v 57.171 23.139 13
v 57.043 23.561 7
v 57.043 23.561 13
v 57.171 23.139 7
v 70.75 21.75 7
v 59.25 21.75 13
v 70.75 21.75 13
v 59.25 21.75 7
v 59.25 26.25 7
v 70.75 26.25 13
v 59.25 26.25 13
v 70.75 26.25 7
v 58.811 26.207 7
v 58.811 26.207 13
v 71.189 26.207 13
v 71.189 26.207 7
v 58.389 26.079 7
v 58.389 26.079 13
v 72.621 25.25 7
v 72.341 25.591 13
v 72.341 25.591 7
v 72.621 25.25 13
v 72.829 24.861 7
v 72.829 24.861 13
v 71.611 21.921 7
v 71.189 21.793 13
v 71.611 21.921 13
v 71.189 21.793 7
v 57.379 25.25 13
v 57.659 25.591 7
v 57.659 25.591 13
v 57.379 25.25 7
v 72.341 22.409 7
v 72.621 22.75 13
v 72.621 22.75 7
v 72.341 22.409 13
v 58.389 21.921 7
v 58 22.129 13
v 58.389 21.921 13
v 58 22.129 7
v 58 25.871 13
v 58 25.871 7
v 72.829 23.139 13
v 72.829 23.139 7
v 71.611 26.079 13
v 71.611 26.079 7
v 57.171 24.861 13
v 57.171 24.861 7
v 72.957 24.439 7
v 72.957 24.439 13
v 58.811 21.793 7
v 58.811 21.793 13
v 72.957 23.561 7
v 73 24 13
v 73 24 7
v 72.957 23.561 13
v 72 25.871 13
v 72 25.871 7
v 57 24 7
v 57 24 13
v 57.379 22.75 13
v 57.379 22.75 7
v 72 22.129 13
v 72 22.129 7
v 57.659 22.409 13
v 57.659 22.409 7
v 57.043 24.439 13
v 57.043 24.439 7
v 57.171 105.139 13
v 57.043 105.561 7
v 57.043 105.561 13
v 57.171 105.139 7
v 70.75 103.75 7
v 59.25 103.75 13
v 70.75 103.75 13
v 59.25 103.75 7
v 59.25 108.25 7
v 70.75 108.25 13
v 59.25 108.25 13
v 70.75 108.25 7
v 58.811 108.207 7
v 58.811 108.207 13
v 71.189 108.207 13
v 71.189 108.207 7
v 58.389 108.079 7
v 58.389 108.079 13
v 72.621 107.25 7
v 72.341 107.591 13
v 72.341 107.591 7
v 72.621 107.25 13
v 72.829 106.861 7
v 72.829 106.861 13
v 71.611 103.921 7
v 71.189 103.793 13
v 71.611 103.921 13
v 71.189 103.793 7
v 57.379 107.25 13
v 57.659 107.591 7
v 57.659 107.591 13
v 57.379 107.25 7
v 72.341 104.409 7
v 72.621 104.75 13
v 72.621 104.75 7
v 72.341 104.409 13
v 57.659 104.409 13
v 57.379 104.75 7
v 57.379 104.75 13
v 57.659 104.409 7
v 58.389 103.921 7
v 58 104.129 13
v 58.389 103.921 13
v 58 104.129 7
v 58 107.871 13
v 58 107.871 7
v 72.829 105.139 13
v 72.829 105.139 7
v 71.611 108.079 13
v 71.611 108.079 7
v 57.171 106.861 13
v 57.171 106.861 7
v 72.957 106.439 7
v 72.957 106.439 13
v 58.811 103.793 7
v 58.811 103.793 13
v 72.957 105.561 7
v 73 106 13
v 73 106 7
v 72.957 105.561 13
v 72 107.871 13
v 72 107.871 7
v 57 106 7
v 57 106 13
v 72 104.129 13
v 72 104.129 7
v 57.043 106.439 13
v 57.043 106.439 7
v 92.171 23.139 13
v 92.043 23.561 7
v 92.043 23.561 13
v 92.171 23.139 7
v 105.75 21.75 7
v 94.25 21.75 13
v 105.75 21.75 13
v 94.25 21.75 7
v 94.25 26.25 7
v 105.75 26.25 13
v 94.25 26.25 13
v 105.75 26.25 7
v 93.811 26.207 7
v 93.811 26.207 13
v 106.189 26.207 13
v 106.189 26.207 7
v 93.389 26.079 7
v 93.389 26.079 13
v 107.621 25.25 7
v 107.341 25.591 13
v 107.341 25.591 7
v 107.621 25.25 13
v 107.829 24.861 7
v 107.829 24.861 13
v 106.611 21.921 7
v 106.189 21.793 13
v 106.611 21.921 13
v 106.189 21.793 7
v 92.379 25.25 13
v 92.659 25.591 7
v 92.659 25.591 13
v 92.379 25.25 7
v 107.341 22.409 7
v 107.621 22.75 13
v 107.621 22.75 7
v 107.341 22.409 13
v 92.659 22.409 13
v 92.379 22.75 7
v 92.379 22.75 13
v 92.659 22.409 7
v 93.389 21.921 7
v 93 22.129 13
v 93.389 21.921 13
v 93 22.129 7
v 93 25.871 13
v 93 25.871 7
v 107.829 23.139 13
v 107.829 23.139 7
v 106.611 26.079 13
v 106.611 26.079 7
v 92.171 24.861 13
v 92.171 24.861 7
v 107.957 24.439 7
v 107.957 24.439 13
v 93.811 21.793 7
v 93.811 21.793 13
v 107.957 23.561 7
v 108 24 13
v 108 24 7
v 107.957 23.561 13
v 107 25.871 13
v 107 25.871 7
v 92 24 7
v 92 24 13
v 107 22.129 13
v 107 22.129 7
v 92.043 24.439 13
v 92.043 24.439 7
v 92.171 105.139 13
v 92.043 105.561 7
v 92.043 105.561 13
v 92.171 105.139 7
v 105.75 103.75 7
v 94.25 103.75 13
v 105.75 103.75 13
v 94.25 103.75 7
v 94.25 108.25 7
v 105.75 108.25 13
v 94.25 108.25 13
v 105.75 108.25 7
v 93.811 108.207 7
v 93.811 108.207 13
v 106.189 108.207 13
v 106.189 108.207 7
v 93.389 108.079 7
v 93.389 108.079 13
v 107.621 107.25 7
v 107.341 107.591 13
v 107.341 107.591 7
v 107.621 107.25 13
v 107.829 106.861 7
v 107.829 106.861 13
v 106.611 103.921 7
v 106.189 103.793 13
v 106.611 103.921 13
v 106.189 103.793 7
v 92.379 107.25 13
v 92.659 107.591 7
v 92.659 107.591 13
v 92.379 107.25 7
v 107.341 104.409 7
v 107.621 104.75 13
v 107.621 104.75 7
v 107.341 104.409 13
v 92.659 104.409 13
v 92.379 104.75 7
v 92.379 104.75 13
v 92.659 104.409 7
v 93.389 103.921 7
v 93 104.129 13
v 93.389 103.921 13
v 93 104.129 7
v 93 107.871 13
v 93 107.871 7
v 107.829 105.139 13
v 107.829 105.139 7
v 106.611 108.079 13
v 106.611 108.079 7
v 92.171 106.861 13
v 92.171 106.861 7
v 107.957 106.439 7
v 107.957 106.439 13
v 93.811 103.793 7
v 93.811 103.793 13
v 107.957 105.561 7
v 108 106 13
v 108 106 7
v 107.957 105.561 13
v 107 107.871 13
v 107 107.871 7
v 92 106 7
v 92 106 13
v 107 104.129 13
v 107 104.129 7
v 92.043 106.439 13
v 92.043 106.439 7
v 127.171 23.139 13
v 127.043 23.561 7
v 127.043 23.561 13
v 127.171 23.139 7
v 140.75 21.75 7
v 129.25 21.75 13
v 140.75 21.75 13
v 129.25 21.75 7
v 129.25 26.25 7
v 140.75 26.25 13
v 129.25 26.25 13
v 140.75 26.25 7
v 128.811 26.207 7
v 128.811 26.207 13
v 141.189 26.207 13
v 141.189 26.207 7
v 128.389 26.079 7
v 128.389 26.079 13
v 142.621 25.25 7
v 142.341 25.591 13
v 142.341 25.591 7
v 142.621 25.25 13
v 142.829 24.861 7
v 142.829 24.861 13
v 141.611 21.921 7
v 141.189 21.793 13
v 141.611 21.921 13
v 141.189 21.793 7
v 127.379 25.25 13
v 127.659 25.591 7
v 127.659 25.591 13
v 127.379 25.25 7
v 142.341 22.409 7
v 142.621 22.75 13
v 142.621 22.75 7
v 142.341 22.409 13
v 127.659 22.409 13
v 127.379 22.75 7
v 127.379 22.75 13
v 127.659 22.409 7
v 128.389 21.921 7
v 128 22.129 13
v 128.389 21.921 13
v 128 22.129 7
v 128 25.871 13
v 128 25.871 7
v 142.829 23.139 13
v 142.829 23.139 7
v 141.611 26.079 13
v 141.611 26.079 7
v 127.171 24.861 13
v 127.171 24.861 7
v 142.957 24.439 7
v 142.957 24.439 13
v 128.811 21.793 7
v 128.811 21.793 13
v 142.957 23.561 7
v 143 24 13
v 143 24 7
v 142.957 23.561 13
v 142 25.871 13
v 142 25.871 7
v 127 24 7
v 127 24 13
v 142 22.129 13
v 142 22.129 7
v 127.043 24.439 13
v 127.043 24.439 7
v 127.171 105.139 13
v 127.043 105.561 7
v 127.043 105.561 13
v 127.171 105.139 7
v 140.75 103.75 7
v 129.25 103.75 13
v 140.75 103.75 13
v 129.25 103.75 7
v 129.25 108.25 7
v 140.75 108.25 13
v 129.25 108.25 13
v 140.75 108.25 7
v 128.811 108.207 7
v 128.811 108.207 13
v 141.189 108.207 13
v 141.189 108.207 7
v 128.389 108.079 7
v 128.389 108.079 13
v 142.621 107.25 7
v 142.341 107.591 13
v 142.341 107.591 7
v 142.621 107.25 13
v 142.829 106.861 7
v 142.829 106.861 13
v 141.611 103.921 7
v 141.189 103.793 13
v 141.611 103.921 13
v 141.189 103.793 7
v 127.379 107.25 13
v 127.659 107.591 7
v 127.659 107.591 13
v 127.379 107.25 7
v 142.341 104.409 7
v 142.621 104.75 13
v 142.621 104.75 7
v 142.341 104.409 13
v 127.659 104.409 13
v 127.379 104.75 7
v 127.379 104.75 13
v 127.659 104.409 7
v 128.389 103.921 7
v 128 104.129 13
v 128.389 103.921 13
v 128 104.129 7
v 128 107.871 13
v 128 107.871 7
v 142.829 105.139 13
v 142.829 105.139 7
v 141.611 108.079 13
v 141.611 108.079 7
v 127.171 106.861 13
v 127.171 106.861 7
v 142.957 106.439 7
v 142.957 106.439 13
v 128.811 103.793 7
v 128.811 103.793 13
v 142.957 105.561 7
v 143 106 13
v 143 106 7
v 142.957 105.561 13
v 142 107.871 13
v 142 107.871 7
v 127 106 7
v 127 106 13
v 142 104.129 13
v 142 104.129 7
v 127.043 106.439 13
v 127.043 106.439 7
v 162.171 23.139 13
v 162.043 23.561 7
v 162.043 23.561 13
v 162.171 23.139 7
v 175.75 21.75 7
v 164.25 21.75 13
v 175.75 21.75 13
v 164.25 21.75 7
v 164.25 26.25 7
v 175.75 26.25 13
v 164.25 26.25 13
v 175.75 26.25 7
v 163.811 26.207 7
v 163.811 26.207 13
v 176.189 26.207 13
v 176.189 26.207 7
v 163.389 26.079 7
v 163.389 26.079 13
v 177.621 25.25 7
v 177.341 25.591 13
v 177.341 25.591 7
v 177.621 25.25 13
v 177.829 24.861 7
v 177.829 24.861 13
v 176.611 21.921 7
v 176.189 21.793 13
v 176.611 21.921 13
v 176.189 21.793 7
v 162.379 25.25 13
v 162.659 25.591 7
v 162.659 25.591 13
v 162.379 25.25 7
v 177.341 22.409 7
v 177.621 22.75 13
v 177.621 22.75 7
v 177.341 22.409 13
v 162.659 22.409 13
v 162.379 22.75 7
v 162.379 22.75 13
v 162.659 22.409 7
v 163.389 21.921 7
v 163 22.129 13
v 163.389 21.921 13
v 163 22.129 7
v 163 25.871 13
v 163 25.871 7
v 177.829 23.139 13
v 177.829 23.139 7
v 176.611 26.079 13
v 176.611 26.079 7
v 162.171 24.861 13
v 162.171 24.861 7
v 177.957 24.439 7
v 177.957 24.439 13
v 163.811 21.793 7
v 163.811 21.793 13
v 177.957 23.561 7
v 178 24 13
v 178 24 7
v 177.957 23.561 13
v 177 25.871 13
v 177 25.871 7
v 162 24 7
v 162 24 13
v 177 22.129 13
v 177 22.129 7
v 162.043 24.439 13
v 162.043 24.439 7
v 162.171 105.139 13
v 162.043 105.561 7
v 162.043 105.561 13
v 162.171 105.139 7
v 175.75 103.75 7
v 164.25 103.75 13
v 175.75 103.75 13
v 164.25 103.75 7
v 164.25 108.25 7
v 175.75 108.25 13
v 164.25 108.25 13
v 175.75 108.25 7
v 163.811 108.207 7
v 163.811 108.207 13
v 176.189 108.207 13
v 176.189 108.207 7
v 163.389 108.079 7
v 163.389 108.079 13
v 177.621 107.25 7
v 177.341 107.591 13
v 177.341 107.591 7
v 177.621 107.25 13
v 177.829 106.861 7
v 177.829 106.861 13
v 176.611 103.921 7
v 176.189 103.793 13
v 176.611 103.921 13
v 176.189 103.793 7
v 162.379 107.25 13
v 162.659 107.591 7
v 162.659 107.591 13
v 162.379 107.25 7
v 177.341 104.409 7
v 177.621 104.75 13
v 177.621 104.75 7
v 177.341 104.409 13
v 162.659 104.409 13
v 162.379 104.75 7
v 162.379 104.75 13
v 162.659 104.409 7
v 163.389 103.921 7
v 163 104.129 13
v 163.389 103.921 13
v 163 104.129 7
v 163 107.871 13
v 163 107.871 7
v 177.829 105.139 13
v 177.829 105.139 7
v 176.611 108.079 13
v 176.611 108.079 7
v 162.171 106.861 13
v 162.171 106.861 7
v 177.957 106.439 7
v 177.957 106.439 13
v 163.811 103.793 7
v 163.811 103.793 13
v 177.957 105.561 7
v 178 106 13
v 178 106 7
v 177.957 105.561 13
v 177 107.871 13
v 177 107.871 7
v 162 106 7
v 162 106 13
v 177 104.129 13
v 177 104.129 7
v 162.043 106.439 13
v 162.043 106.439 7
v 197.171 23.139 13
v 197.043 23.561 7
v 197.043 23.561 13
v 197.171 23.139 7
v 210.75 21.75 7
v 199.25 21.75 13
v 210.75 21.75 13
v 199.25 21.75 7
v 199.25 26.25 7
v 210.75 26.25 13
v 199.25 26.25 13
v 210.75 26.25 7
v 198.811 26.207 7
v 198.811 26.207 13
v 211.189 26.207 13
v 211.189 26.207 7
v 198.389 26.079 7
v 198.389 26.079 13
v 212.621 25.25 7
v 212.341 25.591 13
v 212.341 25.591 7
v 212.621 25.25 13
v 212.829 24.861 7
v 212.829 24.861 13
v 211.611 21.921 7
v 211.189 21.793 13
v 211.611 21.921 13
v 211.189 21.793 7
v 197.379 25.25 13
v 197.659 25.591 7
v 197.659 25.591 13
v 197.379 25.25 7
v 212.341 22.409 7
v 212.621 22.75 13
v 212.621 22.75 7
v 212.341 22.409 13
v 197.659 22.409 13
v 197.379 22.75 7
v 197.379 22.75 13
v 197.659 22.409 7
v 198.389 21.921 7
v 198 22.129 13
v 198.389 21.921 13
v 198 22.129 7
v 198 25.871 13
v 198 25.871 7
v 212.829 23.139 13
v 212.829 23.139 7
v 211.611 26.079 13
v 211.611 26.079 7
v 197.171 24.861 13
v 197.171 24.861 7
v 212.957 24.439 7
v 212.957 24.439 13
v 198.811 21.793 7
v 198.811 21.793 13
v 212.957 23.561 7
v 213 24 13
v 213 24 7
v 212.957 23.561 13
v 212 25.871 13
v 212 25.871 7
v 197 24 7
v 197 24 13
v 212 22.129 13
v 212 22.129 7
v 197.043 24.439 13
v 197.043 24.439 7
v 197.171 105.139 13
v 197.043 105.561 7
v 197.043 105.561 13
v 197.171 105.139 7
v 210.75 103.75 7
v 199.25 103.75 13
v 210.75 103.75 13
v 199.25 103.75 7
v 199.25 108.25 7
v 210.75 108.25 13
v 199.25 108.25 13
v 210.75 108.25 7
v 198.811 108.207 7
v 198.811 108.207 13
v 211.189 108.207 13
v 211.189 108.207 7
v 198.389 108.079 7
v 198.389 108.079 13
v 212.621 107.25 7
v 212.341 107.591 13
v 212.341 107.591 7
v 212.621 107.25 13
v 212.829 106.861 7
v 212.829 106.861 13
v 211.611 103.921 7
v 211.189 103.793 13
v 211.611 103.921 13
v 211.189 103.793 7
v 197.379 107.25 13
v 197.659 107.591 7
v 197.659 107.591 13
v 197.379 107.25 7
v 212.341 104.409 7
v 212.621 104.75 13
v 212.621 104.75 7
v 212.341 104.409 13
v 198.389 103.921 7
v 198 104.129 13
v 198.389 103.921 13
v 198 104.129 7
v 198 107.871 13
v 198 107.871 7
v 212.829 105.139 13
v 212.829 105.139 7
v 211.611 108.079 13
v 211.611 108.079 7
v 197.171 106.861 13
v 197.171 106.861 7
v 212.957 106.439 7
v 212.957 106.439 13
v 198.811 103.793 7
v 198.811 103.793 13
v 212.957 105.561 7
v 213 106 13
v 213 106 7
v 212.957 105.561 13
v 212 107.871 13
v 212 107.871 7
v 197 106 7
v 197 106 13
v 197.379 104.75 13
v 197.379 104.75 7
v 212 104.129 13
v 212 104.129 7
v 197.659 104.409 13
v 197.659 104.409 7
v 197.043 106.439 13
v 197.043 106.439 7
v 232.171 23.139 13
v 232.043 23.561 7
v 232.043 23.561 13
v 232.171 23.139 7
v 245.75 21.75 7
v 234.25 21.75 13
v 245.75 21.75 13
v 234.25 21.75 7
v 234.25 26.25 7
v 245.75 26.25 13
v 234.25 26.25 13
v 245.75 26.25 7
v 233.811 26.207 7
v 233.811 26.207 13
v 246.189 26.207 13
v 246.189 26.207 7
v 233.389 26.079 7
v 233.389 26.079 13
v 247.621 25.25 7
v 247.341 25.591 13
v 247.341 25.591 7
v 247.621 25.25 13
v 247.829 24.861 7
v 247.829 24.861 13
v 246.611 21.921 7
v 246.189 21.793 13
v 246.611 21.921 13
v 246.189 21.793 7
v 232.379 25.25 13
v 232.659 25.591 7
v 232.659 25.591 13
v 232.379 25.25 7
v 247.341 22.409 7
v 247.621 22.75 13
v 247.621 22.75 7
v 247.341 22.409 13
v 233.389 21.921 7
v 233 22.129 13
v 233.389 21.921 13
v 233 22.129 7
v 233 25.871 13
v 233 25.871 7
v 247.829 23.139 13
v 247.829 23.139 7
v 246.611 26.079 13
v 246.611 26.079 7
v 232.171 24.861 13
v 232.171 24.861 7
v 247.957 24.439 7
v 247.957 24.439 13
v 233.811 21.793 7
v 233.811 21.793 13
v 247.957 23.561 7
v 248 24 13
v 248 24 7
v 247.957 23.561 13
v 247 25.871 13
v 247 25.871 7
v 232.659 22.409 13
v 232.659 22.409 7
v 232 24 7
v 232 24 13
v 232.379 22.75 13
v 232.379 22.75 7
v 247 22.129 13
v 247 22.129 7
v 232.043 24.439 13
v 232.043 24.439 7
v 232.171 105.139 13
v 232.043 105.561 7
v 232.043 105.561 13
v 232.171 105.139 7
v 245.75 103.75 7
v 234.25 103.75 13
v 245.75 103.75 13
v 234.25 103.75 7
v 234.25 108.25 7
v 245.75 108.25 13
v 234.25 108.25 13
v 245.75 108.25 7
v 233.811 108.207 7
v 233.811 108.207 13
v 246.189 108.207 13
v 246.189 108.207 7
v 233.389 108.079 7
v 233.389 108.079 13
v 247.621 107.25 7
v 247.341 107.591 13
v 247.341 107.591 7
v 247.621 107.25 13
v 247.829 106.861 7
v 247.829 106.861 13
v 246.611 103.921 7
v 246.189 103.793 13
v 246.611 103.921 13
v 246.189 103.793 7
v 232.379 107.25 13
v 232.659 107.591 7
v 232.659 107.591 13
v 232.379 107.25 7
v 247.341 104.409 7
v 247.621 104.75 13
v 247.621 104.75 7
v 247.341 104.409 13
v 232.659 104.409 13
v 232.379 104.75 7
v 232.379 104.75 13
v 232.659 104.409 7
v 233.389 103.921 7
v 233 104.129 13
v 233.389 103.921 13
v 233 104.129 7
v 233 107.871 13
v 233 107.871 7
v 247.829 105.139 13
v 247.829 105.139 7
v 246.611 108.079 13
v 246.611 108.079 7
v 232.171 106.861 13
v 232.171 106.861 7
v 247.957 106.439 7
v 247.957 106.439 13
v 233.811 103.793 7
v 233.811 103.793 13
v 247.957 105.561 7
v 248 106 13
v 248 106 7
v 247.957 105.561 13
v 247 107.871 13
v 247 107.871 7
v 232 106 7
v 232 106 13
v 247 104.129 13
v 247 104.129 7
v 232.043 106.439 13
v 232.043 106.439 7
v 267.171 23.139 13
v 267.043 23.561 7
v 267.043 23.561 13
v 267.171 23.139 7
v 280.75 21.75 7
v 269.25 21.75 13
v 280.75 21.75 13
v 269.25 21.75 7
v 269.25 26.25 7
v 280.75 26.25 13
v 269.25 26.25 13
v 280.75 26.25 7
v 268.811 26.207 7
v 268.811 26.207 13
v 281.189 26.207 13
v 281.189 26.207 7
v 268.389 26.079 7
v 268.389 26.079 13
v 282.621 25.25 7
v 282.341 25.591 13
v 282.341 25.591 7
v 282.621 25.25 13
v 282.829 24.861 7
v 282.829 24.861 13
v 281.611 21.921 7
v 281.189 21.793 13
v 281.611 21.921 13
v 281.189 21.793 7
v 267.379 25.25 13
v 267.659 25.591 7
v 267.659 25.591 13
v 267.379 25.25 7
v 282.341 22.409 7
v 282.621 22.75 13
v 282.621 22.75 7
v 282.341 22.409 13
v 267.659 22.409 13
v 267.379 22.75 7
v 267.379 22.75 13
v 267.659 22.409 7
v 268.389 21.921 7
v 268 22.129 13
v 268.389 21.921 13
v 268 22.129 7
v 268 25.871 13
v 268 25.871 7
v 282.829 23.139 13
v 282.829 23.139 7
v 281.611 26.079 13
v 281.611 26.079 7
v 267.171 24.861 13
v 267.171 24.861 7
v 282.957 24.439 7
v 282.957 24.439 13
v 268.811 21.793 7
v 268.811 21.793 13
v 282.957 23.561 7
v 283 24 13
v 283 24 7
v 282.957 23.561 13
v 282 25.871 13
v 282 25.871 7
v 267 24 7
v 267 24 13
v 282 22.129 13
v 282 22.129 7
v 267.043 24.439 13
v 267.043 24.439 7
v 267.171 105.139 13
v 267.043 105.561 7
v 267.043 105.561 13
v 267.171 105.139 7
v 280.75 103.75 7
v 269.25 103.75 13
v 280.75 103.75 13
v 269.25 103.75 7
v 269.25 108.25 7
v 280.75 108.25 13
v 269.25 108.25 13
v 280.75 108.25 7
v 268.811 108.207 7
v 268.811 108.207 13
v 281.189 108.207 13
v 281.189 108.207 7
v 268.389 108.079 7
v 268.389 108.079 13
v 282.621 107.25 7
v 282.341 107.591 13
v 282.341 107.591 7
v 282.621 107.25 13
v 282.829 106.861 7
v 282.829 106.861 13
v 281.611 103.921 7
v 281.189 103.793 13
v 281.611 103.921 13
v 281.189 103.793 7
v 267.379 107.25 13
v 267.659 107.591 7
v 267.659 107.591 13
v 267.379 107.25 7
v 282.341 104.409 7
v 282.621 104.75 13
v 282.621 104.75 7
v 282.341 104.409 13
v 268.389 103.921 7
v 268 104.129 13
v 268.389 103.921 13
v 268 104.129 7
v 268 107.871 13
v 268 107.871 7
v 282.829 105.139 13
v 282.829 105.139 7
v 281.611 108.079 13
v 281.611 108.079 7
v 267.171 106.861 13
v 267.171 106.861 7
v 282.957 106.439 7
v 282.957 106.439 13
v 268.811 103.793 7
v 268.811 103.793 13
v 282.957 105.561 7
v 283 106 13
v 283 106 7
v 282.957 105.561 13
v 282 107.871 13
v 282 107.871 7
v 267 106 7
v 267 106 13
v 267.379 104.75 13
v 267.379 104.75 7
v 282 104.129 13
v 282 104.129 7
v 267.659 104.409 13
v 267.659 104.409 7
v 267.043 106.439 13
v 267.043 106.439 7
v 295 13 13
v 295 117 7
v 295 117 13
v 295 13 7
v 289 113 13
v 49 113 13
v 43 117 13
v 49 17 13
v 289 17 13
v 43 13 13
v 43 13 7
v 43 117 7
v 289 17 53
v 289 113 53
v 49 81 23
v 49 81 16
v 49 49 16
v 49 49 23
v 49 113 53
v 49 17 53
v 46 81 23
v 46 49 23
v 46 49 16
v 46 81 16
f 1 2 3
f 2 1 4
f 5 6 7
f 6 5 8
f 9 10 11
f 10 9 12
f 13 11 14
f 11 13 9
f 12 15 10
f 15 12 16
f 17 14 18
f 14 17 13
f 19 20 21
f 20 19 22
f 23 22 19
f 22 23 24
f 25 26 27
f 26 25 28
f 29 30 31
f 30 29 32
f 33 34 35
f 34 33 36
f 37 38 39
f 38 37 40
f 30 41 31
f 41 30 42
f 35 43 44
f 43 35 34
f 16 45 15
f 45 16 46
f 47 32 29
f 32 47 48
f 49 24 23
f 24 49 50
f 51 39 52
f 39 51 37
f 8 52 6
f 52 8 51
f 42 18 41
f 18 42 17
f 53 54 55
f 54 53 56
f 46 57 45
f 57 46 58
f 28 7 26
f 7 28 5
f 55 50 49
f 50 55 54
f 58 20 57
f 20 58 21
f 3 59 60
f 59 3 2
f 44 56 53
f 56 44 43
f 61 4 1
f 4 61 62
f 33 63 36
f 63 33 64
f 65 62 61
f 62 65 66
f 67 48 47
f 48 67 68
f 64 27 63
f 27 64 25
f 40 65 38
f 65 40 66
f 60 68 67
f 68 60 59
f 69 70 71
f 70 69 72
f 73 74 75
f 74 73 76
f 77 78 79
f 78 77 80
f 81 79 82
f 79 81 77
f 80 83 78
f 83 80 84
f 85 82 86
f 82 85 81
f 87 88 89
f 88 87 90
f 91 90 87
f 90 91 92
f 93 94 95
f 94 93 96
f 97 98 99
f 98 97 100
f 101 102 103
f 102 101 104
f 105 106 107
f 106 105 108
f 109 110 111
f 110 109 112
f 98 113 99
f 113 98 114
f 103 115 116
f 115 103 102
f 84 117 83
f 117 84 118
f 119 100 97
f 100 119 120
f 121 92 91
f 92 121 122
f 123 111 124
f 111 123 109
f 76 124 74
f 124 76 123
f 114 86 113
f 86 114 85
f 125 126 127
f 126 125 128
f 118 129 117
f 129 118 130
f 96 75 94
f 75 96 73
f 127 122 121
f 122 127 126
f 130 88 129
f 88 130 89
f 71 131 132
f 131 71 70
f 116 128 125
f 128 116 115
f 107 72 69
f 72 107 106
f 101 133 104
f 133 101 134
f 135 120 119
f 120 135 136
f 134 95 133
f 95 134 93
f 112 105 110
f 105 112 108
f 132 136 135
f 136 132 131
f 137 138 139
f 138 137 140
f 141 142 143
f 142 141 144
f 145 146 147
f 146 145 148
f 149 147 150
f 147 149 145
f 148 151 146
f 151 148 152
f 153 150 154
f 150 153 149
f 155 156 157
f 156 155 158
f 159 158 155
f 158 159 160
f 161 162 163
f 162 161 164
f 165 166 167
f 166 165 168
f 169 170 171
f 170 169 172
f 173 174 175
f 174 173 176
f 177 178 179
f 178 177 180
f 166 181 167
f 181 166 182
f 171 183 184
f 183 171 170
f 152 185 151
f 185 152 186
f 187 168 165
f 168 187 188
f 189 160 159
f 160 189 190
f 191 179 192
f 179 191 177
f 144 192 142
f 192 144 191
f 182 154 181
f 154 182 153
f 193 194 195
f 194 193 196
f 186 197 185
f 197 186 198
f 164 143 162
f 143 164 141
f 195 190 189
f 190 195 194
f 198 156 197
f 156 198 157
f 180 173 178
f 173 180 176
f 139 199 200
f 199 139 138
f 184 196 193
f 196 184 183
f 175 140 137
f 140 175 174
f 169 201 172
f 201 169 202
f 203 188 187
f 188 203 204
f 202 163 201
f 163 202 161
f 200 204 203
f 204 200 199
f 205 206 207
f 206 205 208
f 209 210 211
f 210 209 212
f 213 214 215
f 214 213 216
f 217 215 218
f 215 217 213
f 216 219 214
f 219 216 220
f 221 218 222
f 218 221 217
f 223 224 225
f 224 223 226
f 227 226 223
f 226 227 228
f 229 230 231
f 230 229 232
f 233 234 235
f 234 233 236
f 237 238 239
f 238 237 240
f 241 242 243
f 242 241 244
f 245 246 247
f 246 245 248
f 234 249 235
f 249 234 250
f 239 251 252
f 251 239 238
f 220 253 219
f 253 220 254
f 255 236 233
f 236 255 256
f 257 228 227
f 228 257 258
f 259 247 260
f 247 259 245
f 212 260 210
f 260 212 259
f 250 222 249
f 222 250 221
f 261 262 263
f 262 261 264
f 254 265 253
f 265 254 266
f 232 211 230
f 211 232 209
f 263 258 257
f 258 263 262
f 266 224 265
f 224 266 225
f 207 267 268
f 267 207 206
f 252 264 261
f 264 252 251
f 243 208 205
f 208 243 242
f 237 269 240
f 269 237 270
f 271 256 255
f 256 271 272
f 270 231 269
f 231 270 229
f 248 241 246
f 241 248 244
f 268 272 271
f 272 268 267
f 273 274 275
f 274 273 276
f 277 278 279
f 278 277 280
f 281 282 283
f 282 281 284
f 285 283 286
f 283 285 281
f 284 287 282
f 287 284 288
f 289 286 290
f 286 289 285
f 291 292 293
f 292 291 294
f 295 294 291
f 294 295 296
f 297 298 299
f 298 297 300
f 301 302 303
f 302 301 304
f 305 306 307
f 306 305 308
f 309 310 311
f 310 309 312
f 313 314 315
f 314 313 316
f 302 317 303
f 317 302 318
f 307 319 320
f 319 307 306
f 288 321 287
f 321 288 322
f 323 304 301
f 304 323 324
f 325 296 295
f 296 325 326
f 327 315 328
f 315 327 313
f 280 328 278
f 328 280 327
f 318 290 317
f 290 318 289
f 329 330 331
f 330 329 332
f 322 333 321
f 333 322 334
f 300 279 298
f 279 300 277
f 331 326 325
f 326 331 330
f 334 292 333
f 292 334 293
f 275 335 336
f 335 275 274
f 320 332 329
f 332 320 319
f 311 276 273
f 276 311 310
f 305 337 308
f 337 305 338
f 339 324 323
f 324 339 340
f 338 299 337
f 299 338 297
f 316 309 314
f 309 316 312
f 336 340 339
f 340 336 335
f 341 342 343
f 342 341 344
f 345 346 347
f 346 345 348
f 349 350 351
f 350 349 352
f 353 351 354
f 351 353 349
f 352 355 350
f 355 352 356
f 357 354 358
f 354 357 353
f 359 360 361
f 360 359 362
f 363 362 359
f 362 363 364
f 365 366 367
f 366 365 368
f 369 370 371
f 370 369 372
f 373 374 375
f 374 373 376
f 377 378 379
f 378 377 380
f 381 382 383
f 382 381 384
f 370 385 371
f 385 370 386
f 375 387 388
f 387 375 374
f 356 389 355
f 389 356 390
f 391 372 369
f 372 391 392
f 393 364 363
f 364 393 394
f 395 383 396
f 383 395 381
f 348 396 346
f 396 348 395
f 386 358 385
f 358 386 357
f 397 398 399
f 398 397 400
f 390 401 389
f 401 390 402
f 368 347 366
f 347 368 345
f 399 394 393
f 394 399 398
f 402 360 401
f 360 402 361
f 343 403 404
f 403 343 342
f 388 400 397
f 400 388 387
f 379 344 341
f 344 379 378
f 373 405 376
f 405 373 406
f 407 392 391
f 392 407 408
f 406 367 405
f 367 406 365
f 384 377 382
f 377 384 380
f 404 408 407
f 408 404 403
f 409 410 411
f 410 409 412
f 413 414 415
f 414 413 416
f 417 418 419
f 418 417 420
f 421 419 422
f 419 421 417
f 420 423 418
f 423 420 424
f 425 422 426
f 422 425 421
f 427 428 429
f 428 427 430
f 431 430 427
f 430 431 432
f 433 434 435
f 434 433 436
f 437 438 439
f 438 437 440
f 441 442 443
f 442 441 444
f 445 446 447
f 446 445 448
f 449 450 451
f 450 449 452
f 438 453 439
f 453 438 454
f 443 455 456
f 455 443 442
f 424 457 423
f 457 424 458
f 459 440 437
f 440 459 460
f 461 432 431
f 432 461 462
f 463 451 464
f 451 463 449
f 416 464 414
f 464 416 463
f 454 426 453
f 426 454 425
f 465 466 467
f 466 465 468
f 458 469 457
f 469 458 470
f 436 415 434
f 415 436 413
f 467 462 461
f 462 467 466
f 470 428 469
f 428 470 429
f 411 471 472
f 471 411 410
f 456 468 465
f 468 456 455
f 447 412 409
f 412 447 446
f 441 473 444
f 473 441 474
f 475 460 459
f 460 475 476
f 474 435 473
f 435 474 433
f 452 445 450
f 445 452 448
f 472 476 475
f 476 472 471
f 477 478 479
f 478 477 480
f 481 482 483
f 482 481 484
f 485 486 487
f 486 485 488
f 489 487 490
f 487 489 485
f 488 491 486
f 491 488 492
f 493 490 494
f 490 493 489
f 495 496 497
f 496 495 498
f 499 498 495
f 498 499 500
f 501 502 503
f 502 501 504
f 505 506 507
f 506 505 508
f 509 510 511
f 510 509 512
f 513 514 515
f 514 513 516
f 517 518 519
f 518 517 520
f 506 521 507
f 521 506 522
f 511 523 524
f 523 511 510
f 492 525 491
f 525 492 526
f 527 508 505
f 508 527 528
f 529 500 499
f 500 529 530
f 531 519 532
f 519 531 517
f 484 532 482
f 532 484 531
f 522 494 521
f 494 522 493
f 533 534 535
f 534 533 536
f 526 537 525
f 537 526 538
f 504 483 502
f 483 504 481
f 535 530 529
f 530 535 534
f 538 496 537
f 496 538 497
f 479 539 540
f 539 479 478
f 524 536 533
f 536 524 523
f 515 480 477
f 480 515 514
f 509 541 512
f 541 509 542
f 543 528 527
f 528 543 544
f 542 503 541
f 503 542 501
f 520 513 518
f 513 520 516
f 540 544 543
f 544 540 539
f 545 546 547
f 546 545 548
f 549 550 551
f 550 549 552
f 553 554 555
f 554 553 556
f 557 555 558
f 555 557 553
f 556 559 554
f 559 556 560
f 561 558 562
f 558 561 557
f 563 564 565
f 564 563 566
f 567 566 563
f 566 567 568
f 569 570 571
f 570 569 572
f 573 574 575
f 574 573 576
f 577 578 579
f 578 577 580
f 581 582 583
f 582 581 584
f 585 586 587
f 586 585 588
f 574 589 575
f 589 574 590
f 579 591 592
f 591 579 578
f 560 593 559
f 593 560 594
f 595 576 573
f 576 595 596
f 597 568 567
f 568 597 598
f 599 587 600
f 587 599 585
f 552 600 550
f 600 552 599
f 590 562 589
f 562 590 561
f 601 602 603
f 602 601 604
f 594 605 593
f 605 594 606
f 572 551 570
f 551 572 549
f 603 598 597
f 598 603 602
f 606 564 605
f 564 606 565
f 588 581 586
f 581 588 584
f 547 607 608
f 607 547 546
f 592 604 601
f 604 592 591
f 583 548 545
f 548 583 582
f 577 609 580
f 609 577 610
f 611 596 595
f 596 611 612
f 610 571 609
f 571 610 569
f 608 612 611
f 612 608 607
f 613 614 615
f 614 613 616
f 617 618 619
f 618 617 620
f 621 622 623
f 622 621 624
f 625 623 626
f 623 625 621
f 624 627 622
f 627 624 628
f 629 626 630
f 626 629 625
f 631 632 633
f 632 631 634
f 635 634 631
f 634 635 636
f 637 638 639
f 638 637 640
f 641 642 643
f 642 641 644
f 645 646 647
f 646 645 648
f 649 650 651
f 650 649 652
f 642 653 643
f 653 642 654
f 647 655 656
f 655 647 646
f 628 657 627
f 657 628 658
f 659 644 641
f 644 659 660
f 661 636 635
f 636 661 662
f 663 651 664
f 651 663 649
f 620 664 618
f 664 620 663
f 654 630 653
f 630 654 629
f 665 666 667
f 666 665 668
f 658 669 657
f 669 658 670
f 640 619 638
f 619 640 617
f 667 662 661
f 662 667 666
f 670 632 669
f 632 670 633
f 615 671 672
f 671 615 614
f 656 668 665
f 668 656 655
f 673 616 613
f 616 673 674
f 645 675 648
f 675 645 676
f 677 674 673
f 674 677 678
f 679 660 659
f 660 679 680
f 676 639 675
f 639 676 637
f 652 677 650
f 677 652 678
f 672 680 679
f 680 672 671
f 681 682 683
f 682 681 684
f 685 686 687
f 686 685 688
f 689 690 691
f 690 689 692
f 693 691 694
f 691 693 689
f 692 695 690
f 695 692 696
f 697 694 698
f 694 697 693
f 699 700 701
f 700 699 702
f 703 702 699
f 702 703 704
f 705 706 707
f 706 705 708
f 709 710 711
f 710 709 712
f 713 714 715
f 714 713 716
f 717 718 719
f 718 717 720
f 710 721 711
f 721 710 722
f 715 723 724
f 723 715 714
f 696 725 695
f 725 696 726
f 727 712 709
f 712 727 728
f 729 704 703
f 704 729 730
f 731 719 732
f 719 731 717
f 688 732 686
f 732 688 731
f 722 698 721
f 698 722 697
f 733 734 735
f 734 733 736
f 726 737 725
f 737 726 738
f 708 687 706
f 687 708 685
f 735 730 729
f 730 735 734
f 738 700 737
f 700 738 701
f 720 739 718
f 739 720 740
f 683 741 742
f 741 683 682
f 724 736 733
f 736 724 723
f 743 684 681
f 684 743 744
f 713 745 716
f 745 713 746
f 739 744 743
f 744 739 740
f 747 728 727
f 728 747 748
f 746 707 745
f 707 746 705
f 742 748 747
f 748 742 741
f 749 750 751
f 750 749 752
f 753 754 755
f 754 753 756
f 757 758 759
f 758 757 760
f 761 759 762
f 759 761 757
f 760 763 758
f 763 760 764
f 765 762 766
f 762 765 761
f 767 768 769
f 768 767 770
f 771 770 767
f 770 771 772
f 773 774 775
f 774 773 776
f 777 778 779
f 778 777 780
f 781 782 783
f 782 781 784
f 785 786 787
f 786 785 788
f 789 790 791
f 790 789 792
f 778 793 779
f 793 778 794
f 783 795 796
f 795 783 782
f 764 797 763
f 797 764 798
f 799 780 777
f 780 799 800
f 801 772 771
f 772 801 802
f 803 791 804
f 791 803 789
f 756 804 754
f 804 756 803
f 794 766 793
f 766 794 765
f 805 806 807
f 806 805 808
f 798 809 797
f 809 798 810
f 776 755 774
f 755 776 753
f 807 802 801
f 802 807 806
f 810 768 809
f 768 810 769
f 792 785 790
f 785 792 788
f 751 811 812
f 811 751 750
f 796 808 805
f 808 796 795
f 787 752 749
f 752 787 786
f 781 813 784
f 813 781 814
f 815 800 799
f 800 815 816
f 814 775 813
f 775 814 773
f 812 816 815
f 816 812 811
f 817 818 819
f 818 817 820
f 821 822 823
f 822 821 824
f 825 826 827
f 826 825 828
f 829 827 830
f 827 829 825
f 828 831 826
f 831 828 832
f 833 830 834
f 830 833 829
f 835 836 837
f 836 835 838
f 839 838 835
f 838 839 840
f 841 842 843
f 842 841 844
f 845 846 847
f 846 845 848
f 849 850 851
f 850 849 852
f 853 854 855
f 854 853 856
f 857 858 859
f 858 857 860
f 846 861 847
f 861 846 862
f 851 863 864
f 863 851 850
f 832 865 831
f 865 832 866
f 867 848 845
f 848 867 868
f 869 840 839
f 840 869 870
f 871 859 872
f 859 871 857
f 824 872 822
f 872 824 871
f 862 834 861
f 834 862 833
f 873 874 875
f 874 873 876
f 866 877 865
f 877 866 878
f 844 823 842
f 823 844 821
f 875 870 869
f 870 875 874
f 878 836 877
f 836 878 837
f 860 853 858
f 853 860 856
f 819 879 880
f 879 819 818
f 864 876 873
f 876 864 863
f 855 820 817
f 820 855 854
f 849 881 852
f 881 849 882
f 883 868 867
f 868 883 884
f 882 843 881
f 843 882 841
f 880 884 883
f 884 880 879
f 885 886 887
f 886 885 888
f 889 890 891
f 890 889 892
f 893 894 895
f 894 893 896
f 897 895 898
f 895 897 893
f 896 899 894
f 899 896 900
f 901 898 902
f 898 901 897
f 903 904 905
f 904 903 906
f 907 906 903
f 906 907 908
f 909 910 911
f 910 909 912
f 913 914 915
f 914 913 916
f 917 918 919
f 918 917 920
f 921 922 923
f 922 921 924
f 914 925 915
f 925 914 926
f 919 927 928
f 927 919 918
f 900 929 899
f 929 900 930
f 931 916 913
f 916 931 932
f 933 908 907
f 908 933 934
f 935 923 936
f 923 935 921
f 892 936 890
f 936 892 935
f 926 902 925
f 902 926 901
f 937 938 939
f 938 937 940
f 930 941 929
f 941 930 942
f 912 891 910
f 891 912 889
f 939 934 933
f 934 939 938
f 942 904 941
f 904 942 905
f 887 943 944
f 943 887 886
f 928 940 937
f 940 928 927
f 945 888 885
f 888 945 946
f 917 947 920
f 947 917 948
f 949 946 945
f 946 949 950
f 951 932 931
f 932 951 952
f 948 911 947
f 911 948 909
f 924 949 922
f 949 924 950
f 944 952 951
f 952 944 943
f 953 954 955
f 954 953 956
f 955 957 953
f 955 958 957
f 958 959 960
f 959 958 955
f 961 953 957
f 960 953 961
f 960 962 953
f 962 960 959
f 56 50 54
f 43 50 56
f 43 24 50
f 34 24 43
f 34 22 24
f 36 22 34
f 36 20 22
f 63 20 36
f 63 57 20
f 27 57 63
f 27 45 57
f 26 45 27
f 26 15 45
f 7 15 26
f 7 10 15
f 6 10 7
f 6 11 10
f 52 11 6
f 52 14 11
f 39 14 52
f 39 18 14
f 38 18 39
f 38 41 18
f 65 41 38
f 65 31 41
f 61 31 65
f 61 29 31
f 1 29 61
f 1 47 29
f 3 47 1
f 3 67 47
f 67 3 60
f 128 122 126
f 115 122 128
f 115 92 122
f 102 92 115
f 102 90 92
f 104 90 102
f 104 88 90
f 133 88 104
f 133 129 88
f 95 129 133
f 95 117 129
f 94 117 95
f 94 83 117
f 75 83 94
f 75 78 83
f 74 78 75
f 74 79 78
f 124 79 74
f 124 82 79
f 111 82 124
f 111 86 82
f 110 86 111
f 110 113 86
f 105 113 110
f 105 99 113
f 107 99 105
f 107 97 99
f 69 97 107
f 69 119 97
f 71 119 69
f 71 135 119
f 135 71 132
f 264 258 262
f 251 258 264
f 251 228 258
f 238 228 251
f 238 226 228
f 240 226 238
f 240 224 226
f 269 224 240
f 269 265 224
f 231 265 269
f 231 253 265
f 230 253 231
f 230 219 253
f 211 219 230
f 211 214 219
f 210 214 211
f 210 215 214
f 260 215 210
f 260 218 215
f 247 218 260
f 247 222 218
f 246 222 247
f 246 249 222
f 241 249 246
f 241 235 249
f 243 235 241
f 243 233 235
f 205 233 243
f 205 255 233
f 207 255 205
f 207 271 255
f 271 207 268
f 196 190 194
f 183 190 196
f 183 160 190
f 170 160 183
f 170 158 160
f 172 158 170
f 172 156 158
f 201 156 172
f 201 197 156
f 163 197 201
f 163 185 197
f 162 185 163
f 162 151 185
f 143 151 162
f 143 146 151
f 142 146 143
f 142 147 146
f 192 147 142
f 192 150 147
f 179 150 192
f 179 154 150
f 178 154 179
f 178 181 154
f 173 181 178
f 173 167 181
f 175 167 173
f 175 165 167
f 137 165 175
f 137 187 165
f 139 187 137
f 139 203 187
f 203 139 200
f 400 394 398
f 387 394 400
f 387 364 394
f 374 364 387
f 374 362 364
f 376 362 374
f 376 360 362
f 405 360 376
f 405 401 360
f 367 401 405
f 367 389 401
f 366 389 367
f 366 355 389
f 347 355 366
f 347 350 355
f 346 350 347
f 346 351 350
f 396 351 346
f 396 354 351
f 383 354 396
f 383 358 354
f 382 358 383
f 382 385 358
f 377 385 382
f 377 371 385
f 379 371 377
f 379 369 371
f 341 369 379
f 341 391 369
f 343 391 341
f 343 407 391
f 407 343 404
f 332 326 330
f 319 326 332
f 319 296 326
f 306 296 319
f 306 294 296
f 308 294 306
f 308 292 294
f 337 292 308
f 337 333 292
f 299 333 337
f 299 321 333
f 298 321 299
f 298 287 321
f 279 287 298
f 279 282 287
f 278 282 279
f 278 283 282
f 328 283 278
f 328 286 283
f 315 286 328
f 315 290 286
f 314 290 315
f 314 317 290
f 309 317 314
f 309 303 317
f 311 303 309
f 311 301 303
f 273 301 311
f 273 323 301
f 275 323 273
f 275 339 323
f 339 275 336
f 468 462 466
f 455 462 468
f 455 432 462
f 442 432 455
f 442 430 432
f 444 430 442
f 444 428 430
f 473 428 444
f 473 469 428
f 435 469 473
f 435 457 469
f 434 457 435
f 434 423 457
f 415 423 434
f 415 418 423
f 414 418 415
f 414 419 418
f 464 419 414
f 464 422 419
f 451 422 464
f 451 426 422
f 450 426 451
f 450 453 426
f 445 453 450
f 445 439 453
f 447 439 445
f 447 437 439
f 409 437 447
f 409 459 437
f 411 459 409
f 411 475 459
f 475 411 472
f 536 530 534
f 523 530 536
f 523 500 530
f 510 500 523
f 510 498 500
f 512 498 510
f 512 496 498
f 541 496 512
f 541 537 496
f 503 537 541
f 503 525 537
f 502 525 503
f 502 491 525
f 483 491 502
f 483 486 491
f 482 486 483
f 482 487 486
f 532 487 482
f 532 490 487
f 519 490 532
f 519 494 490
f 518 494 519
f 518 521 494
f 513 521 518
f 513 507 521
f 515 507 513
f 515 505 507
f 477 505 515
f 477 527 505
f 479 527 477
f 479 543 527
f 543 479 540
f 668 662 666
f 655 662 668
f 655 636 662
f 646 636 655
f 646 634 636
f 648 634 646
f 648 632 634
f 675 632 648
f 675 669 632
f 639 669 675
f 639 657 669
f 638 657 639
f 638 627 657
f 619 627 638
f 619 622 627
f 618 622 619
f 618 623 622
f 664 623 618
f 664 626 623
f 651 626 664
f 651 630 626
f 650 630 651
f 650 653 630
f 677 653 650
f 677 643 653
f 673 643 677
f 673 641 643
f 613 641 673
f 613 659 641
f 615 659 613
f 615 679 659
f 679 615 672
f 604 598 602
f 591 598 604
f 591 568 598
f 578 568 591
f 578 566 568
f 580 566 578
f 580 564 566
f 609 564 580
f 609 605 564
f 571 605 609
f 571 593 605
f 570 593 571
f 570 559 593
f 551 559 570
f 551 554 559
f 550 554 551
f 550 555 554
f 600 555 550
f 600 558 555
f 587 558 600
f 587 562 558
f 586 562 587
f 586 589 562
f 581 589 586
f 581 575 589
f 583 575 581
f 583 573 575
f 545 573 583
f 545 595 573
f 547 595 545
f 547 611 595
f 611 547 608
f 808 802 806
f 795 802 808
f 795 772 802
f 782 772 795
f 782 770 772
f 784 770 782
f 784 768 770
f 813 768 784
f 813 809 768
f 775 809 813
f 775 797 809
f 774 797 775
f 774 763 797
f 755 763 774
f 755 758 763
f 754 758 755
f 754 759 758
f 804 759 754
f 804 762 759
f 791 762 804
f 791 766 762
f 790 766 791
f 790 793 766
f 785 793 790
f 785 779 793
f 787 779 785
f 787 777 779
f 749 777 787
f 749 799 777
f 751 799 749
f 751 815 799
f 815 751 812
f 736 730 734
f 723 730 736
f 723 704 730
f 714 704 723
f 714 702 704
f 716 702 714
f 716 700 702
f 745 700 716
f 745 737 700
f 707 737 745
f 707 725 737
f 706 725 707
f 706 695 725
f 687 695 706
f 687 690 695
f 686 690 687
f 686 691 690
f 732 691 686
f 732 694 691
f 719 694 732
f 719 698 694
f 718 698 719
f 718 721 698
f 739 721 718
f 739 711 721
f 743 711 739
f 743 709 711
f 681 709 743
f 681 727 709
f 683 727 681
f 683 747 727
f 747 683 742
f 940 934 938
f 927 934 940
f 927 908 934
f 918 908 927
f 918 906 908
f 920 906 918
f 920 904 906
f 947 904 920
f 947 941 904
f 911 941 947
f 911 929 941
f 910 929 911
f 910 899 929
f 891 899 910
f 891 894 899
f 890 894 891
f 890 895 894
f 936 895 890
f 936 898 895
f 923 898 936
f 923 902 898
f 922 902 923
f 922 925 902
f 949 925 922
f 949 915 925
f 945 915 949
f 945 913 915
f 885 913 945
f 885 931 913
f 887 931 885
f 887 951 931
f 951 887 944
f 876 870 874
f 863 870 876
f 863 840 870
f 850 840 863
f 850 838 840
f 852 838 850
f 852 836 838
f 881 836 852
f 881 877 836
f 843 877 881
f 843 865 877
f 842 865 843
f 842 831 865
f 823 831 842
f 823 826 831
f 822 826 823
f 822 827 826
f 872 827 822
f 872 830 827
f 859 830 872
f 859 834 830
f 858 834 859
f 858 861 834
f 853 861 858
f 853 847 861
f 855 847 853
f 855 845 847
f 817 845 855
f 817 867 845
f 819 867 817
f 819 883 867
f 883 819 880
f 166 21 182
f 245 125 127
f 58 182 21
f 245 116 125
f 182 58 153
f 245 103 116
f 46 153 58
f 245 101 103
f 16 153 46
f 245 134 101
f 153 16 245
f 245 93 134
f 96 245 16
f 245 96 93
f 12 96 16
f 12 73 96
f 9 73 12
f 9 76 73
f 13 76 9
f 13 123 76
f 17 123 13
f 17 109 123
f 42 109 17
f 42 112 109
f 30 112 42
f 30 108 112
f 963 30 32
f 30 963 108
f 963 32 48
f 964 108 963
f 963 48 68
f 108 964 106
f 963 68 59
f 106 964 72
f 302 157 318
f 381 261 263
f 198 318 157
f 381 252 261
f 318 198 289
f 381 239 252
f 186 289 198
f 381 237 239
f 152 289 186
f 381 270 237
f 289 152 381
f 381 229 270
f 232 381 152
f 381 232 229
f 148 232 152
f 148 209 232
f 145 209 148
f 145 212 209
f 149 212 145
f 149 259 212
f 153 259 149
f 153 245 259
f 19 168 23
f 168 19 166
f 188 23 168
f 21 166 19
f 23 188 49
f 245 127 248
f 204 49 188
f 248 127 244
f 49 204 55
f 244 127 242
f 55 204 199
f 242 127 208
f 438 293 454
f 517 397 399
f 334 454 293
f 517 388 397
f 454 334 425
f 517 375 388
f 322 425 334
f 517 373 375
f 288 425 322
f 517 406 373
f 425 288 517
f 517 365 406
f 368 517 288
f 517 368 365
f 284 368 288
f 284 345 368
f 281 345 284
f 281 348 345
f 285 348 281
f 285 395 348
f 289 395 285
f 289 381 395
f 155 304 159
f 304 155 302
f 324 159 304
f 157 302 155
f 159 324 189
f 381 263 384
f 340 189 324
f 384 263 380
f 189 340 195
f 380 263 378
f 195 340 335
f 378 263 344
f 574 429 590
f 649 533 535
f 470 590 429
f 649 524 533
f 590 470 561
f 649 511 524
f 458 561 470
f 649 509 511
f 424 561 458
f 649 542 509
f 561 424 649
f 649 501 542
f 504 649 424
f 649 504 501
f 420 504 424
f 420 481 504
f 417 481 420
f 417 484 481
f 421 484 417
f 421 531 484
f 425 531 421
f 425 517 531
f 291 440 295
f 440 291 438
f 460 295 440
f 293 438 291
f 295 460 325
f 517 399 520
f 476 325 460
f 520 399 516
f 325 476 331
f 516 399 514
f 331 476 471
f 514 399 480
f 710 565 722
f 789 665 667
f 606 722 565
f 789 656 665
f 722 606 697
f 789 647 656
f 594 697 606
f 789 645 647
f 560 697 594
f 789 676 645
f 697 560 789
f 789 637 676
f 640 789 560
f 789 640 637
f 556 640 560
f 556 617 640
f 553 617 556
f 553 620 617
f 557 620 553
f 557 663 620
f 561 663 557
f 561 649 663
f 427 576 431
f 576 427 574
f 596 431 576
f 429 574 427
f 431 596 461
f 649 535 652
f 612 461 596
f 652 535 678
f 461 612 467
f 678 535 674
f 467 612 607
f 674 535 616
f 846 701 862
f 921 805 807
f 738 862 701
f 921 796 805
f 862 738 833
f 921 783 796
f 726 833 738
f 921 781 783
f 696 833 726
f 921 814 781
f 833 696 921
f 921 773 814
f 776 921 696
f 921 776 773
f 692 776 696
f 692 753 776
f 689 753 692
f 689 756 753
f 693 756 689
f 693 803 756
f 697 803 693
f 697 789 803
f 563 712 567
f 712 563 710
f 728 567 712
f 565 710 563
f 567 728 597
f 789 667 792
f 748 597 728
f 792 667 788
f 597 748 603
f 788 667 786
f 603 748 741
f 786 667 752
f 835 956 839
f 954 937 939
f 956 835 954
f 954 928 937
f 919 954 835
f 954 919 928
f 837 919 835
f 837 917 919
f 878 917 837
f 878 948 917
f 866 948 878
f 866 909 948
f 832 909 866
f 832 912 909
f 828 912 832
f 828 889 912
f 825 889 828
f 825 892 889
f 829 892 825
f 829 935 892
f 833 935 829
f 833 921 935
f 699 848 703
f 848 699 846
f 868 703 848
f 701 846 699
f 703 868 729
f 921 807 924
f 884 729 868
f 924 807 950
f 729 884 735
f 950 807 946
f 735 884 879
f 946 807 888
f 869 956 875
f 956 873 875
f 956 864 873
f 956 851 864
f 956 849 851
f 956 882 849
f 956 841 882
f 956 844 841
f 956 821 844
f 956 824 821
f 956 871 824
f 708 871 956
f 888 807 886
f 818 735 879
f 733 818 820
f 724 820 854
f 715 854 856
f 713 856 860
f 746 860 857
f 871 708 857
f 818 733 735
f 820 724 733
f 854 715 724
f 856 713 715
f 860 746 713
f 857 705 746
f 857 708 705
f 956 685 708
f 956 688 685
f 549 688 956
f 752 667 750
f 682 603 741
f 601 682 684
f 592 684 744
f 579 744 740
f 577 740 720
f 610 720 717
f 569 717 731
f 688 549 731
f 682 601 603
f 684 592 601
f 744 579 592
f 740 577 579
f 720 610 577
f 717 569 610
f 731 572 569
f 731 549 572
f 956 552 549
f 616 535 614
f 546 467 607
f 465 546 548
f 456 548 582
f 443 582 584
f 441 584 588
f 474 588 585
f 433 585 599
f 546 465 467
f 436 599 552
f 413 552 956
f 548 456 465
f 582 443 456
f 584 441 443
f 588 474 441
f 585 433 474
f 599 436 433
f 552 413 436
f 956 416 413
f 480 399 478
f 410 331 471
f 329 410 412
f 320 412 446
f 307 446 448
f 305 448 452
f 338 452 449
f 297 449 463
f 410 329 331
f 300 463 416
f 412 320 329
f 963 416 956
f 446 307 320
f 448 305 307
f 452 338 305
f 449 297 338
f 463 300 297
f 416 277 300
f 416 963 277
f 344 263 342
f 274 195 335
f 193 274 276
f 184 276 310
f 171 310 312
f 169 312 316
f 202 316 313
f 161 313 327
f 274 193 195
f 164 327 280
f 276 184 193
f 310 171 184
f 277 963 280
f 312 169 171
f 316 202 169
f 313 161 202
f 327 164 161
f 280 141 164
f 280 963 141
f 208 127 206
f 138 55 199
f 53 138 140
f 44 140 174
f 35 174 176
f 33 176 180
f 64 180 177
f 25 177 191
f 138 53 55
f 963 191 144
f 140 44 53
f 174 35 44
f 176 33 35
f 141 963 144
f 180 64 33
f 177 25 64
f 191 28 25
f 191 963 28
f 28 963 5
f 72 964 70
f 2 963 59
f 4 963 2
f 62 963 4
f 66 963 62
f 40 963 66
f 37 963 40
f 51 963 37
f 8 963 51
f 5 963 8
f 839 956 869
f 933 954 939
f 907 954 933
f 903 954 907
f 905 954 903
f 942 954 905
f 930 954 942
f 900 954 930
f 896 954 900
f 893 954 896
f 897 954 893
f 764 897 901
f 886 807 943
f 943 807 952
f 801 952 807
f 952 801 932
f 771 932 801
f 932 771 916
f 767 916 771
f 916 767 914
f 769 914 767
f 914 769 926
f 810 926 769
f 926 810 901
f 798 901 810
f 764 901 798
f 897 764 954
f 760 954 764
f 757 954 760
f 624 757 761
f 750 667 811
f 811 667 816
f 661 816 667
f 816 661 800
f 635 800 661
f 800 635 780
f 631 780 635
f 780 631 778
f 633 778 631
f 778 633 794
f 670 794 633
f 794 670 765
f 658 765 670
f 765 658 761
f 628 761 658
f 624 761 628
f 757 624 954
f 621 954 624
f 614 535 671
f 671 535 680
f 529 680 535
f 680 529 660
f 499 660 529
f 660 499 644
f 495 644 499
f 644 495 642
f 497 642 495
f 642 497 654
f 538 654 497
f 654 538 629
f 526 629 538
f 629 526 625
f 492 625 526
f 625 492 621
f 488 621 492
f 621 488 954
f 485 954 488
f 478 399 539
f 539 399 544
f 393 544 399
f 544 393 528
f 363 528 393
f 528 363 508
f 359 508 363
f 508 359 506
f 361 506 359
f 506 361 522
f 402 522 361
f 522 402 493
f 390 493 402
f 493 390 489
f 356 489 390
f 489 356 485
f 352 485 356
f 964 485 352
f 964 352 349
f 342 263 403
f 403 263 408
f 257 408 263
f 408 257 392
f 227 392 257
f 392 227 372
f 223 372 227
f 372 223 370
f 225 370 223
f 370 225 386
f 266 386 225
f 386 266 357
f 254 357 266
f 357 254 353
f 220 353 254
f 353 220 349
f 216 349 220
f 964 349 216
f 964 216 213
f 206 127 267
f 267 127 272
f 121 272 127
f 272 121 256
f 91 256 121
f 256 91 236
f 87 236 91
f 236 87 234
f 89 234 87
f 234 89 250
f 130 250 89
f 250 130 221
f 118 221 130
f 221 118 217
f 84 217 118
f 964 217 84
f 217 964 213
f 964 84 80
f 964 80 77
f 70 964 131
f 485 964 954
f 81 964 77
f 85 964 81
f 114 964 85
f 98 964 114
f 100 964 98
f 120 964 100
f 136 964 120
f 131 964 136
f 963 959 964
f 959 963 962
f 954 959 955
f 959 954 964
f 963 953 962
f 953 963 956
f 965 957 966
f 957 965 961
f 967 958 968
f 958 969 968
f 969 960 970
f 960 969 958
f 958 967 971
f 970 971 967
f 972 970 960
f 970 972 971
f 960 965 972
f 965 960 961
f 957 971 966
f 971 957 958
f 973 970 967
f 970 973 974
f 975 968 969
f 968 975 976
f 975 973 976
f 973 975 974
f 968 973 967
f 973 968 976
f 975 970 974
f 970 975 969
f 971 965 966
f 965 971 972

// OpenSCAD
// Fully internal universal PSU chassis.
// Conceptual interface derived from NexGen's separate PSU mount strategy.
// No part of the PSU carrier may exceed the common body envelope.

$fn = 32;

variant = "cisco"; // cisco | flexatx

body_length = 330;
rear_inner_plane = 318;
rail_origin = [43, 13, 7];
rail_size = [252, 104, 6];
adapter_pitch_y = 82;

// Provisional equipment envelopes. Replace after physical measurement.
cisco = [240, 96, 40];
flexatx = [150, 81.5, 40.5];

module elongated_hole(length = 14, diameter = 4.5, height = 10) {
    hull() {
        translate([-length / 2 + diameter / 2, 0, 0]) cylinder(h = height, d = diameter);
        translate([ length / 2 - diameter / 2, 0, 0]) cylinder(h = height, d = diameter);
    }
}

module common_rail() {
    color([0.20, 0.22, 0.25])
    difference() {
        translate(rail_origin) cube(rail_size);
        for (x = [rail_origin[0] + 22 : 35 : rail_origin[0] + rail_size[0] - 18],
             y = [rail_origin[1] + 11, rail_origin[1] + rail_size[1] - 11])
            translate([x, y, rail_origin[2] - 1]) elongated_hole(16, 4.5, rail_size[2] + 2);
    }
}

module cisco_adapter() {
    origin = [49, 17, rail_origin[2] + rail_size[2]];
    color([0.92, 0.45, 0.08]) {
        translate(origin) cube([cisco[0], 4, 12]);
        translate([origin[0], origin[1] + cisco[1] - 4, origin[2]]) cube([cisco[0], 4, 12]);
        translate([origin[0] + cisco[0] - 5, origin[1], origin[2]]) cube([5, cisco[1], 26]);
    }
    color([0.92, 0.45, 0.08])
        translate([origin[0] - 3, origin[1] + 32, origin[2] + 3]) cube([6, 32, 7]);
}

module flexatx_adapter() {
    origin = [108, 24.25, rail_origin[2] + rail_size[2]];
    color([0.18, 0.48, 0.88]) {
        translate(origin) cube([flexatx[0], 4, 12]);
        translate([origin[0], origin[1] + flexatx[1] - 4, origin[2]]) cube([flexatx[0], 4, 12]);
        translate([origin[0] + flexatx[0] - 5, origin[1], origin[2]]) cube([5, flexatx[1], 30]);
    }
}

module envelope(size, origin) {
    color([0.55, 0.58, 0.62, 0.28]) translate(origin) cube(size);
}

common_rail();
if (variant == "cisco") {
    cisco_adapter();
    envelope(cisco, [49, 17, rail_origin[2] + rail_size[2]]);
} else {
    flexatx_adapter();
    envelope(flexatx, [108, 24.25, rail_origin[2] + rail_size[2]]);
}

echo("variant", variant);
echo("rail_end_x", rail_origin[0] + rail_size[0]);
echo("rear_inner_plane_x", rear_inner_plane);
echo("flush_margin_mm", rear_inner_plane - (rail_origin[0] + rail_size[0]));
assert(rail_origin[0] + rail_size[0] <= rear_inner_plane, "PSU rail protrudes beyond rear inner plane");
